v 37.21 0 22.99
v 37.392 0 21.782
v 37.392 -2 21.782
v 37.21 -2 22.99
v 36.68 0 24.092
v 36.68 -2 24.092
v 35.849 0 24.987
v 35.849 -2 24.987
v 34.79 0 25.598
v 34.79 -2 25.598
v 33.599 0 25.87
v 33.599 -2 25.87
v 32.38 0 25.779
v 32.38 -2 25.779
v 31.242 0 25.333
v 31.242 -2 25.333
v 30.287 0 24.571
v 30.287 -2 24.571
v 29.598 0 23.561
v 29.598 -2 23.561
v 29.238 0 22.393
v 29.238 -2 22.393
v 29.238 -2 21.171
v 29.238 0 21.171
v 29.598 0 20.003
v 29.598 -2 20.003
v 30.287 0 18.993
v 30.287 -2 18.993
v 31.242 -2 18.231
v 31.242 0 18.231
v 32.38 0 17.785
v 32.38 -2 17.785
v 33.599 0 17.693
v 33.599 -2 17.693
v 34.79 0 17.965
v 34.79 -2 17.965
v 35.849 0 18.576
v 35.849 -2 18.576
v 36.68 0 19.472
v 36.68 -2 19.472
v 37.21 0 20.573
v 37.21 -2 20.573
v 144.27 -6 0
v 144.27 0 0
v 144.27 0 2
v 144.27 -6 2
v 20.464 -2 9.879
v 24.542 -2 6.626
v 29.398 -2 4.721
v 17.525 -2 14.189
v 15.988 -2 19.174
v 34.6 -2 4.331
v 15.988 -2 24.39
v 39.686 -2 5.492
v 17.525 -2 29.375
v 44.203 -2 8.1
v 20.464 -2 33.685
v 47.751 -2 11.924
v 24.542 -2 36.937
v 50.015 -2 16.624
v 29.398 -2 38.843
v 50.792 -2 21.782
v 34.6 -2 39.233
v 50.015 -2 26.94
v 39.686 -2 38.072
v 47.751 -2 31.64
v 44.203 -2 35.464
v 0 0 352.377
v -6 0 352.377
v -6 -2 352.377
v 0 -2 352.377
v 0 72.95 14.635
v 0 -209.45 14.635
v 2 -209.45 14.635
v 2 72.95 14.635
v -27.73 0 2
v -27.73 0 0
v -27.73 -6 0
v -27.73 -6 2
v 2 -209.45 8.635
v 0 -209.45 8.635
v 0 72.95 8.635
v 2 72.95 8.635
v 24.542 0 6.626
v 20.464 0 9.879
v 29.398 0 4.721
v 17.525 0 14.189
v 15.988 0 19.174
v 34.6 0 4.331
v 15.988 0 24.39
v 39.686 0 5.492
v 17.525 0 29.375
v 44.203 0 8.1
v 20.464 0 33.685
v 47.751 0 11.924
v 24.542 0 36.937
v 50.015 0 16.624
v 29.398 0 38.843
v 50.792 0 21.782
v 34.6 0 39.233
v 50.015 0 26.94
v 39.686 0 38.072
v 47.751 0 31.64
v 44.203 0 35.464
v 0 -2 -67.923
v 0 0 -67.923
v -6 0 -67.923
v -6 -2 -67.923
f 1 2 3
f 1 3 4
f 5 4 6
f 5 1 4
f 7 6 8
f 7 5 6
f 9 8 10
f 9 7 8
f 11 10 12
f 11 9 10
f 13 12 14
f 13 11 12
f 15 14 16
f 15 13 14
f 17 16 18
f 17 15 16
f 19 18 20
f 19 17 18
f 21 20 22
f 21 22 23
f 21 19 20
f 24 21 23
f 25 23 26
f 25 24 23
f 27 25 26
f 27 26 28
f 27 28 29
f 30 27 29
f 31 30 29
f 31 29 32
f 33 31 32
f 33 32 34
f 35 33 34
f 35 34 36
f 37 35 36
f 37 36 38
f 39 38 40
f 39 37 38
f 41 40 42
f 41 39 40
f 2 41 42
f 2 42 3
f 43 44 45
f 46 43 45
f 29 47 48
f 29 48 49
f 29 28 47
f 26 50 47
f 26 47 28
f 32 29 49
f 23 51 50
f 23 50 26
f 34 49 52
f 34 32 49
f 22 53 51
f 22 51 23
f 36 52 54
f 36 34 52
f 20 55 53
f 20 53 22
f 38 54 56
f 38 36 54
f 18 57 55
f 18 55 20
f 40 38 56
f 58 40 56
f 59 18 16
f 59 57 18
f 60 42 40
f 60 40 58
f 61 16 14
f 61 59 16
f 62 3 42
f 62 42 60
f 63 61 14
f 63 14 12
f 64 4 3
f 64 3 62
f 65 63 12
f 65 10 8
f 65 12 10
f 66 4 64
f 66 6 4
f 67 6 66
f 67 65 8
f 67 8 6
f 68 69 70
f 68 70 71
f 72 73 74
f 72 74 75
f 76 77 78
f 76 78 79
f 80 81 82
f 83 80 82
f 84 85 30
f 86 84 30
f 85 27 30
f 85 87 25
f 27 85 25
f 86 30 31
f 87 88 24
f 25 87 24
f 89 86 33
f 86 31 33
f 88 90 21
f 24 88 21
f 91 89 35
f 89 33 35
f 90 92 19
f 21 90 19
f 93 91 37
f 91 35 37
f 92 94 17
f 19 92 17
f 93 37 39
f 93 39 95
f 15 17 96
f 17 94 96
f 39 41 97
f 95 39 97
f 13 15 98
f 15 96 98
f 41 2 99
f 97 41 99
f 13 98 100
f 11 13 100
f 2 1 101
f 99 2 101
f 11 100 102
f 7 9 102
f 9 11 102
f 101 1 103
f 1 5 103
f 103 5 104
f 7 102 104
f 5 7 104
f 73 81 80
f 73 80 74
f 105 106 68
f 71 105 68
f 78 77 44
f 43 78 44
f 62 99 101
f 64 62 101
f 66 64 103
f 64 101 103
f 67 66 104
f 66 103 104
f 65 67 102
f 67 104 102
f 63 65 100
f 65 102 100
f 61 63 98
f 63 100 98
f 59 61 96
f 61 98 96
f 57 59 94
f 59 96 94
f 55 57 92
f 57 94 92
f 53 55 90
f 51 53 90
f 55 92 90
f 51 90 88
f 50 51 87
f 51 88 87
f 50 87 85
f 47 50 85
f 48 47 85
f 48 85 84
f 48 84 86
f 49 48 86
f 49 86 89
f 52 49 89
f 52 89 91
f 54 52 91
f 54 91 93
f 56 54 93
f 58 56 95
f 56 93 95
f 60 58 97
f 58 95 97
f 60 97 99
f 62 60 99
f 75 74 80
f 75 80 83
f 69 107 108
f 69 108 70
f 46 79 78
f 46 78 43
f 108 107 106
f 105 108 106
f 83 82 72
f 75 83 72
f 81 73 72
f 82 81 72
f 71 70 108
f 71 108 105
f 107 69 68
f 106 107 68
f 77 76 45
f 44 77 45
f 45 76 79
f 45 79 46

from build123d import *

# Parameters (mm, degrees)
F0_W     = 172
F0_H     = 2
F1_DEPTH = 6
F2_W     = 282.4
F2_H     = 6
F3_DEPTH = 2
F4_W     = 6
F4_H     = 420.3
F5_DEPTH = 2
F6_R     = 17.5
F6_R_2   = 4.1
F7_DEPTH = 2


with BuildPart() as f1:
    # F0 (on Front) → F1 (new body)
    with BuildSketch(Plane.XZ):
        with Locations((58.270465, 1)):
            Rectangle(F0_W, F0_H)
    extrude(amount=F1_DEPTH)


with BuildPart() as f3:
    # F2 (on Right) → F3 (new body)
    with BuildSketch(Plane.YZ):
        with Locations((-68.24992, 11.635434)):
            Rectangle(F2_W, F2_H)
    extrude(amount=F3_DEPTH)


with BuildPart() as f5:
    # F4 (on Front) → F5 (new body)
    with BuildSketch(Plane.XZ):
        with Locations((-3, 142.226514)):
            Rectangle(F4_W, F4_H)
    extrude(amount=F5_DEPTH)


with BuildPart() as f7:
    # F6 (on Front) → F7 (new body)
    with BuildSketch(Plane.XZ):
        with Locations((33.292264, 21.781916)):
            Circle(F6_R)
        with Locations((33.292264, 21.781916)):
            Circle(F6_R_2, mode=Mode.SUBTRACT)
    extrude(amount=F7_DEPTH)


solid = Compound([f1.part, f3.part, f5.part, f7.part])
